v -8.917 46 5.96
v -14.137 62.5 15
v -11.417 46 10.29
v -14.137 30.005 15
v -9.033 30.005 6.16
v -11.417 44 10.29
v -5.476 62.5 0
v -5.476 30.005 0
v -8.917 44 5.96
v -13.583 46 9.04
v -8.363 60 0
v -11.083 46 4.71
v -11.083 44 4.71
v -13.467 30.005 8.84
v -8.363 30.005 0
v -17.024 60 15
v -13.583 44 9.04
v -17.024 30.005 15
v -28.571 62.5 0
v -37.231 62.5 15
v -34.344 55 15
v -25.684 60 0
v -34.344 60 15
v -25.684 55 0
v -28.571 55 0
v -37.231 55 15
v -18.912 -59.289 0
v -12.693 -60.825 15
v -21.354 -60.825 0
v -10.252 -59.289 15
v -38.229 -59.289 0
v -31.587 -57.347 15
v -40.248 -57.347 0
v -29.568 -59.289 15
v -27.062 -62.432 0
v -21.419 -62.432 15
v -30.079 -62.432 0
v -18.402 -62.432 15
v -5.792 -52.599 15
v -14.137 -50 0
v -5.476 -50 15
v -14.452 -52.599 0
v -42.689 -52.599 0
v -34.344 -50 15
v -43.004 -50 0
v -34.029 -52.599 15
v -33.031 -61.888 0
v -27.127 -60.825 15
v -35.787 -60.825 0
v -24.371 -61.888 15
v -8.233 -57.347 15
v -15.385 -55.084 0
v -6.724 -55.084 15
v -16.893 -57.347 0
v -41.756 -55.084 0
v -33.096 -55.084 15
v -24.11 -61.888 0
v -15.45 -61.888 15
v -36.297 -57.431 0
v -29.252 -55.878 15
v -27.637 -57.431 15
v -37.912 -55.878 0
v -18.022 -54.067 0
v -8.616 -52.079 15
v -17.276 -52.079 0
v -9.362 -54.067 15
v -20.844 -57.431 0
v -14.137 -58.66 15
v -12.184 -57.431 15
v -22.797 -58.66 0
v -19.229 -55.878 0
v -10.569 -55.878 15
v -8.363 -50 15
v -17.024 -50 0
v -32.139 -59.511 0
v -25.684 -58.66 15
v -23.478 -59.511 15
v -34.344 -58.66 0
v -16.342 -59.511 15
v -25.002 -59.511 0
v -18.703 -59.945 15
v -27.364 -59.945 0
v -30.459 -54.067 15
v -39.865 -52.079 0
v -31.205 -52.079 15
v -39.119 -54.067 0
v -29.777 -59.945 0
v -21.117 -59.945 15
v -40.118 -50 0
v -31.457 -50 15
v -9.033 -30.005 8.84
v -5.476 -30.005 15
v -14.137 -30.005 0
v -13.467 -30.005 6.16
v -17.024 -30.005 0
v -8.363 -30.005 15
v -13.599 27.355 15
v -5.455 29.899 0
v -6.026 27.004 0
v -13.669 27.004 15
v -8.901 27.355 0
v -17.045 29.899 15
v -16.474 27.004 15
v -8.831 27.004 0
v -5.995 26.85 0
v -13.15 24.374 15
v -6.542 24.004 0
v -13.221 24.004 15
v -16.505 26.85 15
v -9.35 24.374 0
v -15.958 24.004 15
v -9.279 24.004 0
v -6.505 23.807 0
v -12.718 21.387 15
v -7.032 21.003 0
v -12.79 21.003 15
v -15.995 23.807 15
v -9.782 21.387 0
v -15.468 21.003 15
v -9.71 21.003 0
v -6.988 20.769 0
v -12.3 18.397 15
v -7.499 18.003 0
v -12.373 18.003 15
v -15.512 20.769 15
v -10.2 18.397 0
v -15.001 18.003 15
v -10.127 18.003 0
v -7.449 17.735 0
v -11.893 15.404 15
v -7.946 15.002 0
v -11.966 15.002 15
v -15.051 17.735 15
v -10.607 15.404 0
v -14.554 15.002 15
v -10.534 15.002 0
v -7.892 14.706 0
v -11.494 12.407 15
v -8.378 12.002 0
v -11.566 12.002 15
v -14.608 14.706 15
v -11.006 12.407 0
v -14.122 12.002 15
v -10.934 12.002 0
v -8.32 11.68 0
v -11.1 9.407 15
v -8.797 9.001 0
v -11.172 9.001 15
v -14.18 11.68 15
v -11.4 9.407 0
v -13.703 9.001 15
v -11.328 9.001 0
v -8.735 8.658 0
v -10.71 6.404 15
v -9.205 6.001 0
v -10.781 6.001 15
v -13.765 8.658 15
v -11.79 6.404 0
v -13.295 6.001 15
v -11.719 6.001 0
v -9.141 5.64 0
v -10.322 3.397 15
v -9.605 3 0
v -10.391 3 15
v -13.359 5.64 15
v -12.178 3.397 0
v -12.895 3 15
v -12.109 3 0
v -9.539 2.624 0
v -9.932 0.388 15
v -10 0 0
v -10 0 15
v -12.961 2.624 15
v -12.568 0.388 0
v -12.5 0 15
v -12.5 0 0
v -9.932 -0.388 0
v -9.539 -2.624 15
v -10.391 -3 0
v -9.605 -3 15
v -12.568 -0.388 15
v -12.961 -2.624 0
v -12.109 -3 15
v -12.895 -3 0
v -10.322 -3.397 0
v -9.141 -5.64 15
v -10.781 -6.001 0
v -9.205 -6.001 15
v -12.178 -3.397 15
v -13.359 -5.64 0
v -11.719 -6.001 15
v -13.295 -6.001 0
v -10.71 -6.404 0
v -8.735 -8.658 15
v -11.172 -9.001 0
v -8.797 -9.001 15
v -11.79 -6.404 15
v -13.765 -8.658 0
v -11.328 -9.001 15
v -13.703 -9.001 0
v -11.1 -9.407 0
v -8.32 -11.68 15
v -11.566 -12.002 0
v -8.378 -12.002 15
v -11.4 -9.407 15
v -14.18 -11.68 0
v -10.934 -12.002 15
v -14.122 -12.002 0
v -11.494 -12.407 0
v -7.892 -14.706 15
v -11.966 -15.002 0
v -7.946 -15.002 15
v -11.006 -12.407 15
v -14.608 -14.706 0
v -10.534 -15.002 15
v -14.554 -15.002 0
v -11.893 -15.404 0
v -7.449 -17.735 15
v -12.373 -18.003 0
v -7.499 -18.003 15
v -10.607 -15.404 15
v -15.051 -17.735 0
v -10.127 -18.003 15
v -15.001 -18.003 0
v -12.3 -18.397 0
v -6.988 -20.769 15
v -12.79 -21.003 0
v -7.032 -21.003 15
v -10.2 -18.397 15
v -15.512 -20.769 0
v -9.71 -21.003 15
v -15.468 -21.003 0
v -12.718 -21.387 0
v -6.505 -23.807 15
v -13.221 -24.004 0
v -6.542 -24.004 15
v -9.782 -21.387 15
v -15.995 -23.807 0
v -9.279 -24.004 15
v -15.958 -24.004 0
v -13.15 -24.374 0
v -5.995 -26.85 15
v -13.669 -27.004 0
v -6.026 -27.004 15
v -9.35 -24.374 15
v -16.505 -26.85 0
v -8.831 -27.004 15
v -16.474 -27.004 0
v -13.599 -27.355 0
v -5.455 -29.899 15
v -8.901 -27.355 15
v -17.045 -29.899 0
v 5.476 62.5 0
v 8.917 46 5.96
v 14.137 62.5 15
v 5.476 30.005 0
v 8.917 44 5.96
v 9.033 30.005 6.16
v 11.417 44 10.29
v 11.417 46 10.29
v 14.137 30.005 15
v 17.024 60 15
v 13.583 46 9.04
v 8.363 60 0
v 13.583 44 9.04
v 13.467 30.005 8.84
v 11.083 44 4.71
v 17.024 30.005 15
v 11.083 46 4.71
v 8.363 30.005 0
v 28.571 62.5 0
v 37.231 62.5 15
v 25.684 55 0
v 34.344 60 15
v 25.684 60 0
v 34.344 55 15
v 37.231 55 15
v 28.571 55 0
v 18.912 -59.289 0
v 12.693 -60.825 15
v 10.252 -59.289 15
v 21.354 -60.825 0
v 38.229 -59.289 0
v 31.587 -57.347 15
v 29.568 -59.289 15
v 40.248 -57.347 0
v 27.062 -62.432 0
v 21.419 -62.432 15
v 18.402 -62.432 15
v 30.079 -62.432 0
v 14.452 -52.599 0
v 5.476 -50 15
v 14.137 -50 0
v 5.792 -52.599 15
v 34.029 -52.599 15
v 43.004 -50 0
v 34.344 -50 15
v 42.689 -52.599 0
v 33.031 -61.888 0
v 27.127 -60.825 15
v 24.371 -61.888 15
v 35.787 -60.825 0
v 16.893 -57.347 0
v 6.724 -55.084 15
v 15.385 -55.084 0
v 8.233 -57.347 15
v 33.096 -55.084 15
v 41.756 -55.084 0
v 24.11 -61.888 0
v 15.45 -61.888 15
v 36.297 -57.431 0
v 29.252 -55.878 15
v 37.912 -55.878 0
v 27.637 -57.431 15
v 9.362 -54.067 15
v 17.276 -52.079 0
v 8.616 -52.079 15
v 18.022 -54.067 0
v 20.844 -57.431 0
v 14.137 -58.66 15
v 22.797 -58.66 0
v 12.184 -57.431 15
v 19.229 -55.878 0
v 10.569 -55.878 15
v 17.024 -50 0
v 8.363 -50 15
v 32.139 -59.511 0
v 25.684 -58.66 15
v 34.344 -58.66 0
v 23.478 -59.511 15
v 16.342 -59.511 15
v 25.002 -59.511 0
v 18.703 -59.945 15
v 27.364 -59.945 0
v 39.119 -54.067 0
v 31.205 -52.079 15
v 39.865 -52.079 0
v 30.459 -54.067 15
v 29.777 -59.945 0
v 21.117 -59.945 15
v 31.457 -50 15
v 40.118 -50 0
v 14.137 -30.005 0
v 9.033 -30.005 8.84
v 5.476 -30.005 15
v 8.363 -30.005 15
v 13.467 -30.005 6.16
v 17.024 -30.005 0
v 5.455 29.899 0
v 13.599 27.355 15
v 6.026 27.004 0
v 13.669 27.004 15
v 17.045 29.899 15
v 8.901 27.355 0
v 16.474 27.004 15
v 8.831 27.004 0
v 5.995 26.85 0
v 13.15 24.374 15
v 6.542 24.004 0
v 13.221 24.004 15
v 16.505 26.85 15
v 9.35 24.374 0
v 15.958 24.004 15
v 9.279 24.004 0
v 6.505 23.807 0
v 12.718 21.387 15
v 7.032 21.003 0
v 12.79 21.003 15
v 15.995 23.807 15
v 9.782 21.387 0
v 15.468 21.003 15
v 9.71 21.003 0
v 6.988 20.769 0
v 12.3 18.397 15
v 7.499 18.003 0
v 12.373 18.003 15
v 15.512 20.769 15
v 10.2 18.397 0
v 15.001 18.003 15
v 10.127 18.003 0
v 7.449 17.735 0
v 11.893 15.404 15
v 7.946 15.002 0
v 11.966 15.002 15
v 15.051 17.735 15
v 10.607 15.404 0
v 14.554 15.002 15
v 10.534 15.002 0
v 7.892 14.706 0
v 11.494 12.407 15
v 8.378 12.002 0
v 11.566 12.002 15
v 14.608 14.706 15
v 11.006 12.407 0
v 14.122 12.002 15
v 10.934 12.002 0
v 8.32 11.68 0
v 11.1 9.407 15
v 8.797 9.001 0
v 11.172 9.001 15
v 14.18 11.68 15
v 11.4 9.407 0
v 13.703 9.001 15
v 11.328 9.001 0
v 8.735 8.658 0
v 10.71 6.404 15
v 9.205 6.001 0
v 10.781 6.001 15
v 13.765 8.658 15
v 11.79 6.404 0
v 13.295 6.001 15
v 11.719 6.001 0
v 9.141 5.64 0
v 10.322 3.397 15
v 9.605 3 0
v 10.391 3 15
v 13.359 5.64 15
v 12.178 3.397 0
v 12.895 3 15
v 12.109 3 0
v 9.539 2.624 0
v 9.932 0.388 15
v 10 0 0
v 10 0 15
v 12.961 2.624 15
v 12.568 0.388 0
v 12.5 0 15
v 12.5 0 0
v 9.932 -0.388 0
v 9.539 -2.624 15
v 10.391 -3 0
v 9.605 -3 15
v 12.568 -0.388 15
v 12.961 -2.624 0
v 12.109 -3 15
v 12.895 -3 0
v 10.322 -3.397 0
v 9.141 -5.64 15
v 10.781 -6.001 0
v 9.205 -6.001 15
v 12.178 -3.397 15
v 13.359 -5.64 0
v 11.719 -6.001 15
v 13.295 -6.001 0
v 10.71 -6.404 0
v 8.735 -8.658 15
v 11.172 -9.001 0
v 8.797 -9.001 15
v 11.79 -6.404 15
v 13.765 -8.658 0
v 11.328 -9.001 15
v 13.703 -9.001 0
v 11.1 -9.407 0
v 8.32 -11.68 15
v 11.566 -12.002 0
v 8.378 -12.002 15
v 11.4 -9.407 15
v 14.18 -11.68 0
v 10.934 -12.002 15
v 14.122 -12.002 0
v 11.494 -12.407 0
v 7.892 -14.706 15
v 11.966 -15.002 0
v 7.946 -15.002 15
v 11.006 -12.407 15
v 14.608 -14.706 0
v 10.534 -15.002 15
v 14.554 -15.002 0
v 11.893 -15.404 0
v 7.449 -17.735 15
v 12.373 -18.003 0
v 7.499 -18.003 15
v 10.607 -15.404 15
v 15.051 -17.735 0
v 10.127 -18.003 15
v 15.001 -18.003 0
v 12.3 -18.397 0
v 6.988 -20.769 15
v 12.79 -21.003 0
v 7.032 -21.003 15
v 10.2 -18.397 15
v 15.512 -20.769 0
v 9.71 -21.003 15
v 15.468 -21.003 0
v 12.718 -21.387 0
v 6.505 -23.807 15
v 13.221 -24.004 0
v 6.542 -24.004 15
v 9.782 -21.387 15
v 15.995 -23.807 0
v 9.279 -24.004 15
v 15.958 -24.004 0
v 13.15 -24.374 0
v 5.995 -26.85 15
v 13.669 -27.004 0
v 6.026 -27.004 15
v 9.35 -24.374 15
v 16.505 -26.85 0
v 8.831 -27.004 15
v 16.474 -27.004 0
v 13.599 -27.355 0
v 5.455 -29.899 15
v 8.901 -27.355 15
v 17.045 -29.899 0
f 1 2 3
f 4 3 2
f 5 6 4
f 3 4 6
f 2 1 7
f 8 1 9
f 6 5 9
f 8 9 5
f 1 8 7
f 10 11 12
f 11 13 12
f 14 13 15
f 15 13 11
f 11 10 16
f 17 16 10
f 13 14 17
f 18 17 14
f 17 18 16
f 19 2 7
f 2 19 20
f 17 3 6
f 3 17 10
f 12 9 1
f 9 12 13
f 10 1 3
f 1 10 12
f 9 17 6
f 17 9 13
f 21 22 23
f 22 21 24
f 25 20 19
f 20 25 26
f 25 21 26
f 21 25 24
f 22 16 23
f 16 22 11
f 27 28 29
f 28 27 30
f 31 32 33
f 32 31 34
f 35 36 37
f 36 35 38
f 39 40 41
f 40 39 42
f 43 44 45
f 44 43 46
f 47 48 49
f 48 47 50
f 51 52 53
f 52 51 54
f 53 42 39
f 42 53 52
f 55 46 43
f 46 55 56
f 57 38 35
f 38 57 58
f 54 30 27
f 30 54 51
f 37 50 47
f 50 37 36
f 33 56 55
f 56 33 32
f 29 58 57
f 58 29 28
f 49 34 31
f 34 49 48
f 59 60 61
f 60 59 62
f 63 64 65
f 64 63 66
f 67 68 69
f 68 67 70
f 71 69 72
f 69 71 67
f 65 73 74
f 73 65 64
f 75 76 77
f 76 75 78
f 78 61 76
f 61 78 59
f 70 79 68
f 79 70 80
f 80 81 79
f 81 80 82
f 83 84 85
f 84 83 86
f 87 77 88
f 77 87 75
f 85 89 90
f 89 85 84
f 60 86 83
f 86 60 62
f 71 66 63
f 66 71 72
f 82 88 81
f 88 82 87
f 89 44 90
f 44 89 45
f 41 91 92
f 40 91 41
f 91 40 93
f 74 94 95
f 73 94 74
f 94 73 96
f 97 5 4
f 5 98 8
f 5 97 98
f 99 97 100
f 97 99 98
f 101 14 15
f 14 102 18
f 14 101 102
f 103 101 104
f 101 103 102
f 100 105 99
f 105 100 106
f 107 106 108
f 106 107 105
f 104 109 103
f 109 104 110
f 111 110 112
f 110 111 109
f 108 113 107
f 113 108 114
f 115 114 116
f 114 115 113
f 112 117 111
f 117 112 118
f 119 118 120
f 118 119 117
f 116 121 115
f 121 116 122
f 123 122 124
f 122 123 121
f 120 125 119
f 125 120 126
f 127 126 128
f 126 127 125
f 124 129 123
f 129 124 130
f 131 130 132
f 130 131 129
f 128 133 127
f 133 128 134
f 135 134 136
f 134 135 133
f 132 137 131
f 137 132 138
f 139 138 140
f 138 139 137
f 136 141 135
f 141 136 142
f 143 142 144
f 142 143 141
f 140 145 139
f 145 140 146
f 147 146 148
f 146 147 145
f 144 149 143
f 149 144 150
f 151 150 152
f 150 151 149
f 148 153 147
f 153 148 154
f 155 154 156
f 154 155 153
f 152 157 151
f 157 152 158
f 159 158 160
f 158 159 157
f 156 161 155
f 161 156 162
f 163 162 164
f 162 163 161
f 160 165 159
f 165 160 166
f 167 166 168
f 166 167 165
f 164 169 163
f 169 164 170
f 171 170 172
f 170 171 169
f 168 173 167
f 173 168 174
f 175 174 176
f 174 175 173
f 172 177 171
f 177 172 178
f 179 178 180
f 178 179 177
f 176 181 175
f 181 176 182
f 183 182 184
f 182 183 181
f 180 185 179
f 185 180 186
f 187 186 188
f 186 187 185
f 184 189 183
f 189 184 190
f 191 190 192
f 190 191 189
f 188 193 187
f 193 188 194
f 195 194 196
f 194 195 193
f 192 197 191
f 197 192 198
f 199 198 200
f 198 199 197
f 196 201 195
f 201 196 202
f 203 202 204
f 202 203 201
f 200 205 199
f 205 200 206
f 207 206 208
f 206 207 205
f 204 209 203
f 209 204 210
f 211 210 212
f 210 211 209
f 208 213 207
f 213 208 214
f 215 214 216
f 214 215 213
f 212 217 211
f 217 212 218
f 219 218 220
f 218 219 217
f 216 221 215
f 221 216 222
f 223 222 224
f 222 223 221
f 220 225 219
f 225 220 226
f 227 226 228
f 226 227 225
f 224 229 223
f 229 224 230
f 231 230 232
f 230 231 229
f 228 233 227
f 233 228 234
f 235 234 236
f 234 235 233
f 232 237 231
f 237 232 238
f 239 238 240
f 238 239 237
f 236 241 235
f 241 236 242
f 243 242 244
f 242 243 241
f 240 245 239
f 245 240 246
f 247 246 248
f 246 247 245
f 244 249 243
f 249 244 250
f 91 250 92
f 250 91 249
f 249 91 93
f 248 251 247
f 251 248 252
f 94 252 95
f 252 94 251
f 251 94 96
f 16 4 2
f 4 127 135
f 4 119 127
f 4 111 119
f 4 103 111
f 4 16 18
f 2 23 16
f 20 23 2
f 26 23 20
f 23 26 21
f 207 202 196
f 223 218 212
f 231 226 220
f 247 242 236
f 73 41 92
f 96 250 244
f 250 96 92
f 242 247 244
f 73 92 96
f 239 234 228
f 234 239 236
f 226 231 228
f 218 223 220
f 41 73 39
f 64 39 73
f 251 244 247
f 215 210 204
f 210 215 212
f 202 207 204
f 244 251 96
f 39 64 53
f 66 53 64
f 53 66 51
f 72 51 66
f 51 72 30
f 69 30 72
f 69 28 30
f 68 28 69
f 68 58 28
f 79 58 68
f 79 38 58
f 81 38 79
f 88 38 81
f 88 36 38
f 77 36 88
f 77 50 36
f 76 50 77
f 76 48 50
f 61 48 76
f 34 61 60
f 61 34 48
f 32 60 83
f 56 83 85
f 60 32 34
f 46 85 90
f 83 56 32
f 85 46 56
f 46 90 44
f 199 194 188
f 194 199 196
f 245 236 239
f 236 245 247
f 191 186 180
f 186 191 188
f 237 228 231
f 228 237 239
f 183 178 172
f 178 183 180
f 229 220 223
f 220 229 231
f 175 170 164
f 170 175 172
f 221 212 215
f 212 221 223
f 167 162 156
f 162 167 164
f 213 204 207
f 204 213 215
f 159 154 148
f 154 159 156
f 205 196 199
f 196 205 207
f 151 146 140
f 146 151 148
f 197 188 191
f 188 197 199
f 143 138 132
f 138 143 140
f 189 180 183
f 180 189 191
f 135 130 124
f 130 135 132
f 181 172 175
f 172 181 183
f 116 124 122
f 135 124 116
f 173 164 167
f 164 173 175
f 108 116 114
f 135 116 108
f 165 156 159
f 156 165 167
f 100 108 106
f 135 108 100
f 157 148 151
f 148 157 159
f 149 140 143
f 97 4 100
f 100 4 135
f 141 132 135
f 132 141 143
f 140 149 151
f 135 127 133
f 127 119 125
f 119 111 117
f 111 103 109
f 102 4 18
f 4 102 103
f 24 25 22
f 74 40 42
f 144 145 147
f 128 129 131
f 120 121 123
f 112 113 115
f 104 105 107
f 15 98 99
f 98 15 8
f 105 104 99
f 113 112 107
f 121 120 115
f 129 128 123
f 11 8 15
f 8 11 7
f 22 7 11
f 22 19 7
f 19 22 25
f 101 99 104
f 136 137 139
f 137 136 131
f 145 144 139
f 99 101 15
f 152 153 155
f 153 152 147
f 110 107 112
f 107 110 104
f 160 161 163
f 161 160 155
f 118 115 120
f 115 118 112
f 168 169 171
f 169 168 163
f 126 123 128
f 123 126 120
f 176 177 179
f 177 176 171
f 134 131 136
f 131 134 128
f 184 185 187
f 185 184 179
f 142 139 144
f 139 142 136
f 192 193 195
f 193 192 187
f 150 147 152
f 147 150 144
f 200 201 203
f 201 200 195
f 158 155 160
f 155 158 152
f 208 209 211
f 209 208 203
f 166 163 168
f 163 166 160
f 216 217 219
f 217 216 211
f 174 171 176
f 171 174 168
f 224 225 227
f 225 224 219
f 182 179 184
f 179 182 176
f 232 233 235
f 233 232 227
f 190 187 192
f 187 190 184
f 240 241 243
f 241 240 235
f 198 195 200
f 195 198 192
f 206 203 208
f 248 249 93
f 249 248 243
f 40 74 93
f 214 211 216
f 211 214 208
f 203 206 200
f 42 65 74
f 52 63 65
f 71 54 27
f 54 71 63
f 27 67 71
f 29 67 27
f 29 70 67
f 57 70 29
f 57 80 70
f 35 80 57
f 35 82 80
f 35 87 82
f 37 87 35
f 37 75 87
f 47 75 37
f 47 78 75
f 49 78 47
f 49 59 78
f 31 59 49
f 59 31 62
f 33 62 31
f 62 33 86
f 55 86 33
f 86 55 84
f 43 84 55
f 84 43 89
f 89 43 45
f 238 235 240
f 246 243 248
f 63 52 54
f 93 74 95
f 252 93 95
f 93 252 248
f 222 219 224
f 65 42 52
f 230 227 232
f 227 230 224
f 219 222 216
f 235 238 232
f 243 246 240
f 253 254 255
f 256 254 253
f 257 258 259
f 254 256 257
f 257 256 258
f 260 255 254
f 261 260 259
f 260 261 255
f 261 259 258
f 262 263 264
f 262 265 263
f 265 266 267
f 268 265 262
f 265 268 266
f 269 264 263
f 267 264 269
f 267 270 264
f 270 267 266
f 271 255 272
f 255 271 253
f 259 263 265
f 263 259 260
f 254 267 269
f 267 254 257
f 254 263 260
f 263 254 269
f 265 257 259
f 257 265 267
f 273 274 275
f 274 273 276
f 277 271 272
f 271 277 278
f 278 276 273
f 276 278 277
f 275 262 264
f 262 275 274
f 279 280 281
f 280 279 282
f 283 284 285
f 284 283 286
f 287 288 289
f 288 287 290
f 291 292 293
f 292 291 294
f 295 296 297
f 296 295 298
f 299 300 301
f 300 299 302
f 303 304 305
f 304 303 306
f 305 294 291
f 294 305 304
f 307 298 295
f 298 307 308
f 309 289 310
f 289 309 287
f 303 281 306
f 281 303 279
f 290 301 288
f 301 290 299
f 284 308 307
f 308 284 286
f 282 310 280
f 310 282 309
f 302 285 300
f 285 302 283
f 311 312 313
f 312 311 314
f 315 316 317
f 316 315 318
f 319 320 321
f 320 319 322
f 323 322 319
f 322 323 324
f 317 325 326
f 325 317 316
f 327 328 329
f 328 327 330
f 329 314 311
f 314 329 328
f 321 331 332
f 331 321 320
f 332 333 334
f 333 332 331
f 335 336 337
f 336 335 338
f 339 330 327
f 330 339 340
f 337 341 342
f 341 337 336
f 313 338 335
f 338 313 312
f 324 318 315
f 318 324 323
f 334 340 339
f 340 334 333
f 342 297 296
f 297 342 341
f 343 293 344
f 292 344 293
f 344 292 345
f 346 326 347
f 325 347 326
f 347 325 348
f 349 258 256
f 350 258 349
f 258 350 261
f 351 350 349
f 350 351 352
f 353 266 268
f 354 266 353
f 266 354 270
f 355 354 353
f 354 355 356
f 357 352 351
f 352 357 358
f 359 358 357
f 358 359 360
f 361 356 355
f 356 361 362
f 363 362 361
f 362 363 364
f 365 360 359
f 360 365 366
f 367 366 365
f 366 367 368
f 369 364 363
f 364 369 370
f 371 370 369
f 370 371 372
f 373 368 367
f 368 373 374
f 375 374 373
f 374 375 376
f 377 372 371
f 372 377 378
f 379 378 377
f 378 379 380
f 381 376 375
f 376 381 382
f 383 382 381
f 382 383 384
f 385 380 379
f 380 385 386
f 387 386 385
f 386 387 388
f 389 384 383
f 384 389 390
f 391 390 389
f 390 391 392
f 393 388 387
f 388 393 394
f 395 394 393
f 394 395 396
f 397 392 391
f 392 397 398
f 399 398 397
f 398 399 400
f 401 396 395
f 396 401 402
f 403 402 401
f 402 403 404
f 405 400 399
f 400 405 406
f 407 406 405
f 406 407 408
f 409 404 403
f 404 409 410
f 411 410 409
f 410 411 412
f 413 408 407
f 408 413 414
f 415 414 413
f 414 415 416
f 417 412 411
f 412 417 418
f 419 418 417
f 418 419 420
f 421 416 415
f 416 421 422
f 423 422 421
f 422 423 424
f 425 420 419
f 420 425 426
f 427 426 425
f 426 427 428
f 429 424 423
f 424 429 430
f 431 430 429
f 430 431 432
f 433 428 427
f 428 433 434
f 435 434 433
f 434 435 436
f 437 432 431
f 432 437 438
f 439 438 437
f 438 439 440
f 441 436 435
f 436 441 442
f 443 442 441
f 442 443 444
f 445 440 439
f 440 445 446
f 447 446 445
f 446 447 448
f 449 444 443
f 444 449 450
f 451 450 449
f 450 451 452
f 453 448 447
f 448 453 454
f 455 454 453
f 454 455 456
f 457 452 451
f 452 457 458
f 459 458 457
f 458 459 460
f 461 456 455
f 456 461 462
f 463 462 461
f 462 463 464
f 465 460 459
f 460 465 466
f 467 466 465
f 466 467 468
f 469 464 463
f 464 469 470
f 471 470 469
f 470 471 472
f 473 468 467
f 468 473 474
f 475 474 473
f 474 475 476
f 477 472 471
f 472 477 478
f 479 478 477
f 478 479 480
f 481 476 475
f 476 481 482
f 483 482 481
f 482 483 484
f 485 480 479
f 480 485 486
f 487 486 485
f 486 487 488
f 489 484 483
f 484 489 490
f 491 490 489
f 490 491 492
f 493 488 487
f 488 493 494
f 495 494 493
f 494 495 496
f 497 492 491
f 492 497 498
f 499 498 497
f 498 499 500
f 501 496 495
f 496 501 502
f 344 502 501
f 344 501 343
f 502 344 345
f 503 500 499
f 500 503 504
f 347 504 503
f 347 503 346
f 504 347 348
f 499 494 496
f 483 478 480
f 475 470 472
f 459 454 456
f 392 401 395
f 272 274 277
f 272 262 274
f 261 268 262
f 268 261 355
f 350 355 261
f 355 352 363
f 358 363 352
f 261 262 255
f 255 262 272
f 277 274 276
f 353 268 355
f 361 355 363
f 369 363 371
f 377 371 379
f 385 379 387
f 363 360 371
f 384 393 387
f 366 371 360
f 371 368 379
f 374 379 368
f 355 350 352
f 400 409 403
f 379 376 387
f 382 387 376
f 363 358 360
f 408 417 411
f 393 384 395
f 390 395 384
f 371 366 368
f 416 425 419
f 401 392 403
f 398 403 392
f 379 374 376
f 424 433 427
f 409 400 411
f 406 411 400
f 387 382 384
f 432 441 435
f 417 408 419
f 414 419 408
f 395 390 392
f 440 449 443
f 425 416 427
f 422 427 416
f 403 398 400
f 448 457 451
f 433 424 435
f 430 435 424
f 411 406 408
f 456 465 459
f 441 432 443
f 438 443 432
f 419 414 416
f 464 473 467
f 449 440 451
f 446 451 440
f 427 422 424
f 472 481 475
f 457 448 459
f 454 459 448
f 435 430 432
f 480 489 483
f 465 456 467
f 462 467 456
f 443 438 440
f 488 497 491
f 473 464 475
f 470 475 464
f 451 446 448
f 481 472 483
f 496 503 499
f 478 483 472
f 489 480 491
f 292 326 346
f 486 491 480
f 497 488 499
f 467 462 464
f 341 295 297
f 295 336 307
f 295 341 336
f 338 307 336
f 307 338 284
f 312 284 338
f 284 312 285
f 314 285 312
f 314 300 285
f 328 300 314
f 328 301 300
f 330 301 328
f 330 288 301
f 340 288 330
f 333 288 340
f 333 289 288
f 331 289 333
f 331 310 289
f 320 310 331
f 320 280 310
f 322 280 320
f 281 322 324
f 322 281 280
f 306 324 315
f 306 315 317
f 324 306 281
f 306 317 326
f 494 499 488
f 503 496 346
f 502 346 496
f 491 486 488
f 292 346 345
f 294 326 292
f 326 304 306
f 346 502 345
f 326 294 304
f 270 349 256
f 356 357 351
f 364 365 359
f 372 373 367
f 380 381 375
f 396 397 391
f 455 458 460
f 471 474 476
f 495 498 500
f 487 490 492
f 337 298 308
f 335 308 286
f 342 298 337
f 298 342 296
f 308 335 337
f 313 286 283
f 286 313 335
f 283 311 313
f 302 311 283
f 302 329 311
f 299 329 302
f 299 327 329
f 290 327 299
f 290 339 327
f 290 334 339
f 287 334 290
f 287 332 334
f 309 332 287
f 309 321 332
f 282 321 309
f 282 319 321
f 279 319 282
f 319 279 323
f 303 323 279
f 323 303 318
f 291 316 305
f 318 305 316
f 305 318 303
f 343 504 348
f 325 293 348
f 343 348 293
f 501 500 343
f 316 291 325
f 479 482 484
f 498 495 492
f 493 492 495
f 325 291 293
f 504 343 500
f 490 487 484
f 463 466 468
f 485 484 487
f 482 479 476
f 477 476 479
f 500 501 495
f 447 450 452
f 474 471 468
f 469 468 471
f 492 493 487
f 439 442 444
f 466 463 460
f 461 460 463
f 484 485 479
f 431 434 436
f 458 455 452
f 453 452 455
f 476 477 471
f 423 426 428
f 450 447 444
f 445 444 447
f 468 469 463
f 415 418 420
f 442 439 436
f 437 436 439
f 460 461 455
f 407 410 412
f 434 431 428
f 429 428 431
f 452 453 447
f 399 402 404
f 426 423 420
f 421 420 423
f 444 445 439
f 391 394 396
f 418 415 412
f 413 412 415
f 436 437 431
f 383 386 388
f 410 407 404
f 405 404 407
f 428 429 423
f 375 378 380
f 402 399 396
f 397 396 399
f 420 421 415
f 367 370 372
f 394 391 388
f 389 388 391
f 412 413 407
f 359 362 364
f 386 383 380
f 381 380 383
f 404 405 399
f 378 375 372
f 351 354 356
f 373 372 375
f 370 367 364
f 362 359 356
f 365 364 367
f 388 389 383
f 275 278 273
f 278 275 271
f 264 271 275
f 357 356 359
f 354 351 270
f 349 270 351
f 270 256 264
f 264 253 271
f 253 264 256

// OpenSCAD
/* [Overall] */

// (mm)
Thickness = 2.5;

// at narrowest point (mm)
Width = 15;

// from top of bar to bottom of rod (mm)
Length = 120;

//(degrees)
TwistAngle = 60; // [0:90]

PartToMake = "both";	// [both,left only,right only]

/* [Bar End] */

// (mm)
BarWidth = 15;

// (mm)
BarHeight = 15;

// for cable tie, 0 to omit (mm)
SlotWidth = 5;

// (mm)
SlotThickness = 2;

/* [Rod End] */

// (mm)
RodDiameter = 20;

/* Derived values */
TwistWidth = 1000 * 2;
EndLength = max(BarHeight * 1.5, RodDiameter * 1.5);
TwistLength = Length - 2 * EndLength;

module BarEnd() {
	rotate([0, -TwistAngle/2, 0]) {
		translate([-BarWidth-Thickness*1.5, Length/2 - BarHeight/3, -TwistWidth/2])
			cube([Thickness, BarHeight/3 + Thickness, TwistWidth]);
		translate([-BarWidth-Thickness*1.5, Length/2, -TwistWidth/2])
			cube([BarWidth + Thickness * 2, Thickness, TwistWidth]);
		difference() {
			translate([-Thickness/2, TwistLength/2, -TwistWidth/2])
				cube([Thickness, EndLength + Thickness, TwistWidth]);
			translate([-Thickness, (Length - SlotThickness) / 2 - BarHeight, -SlotWidth/2])
				cube([Thickness * 2, SlotThickness, SlotWidth]);
		}
	}
}

module RodEnd() {
	rotate([0, TwistAngle/2, 0]) {
		translate([-(Thickness + RodDiameter)/2, -(Length - RodDiameter)/2, 0])
			difference() {
				cylinder(h=TwistWidth, center=true, r=RodDiameter/2 + Thickness);
				cylinder(h=TwistWidth, center=true, r=RodDiameter/2);
				translate([-RodDiameter, 0, -TwistWidth])
					cube([RodDiameter*2, RodDiameter, TwistWidth*2]);
			}
		translate([-Thickness/2, -(Length - RodDiameter)/2, -TwistWidth/2])
			cube([Thickness, EndLength - RodDiameter/2, TwistWidth]);
	}
}

module TwistyPart() {
	rotate([90, 0, 0])
		linear_extrude(height=TwistLength + 0.01, center=true, twist=TwistAngle, slices=20, convexity=10)
			rotate([0, 0, TwistAngle/2])
				square([Thickness, (Width + Thickness) / cos(TwistAngle/2)], center=true);
}

module Complete() {
	translate([0, 0, Width/2]) {
		intersection() {
			cube([1000, 1000, Width], center=true);
			union() {
				BarEnd();
				RodEnd();
				TwistyPart();
			}
		}
	}
}

shift = PartToMake != "both" ? 0 : sin(TwistAngle/2) * Width/2 + Thickness * 3;
if (PartToMake != "right only")
	translate([-shift, 0, 0])
		Complete();
if (PartToMake != "left only")
	translate([shift, 0, 0])
		mirror([1, 0, 0])
			Complete();
